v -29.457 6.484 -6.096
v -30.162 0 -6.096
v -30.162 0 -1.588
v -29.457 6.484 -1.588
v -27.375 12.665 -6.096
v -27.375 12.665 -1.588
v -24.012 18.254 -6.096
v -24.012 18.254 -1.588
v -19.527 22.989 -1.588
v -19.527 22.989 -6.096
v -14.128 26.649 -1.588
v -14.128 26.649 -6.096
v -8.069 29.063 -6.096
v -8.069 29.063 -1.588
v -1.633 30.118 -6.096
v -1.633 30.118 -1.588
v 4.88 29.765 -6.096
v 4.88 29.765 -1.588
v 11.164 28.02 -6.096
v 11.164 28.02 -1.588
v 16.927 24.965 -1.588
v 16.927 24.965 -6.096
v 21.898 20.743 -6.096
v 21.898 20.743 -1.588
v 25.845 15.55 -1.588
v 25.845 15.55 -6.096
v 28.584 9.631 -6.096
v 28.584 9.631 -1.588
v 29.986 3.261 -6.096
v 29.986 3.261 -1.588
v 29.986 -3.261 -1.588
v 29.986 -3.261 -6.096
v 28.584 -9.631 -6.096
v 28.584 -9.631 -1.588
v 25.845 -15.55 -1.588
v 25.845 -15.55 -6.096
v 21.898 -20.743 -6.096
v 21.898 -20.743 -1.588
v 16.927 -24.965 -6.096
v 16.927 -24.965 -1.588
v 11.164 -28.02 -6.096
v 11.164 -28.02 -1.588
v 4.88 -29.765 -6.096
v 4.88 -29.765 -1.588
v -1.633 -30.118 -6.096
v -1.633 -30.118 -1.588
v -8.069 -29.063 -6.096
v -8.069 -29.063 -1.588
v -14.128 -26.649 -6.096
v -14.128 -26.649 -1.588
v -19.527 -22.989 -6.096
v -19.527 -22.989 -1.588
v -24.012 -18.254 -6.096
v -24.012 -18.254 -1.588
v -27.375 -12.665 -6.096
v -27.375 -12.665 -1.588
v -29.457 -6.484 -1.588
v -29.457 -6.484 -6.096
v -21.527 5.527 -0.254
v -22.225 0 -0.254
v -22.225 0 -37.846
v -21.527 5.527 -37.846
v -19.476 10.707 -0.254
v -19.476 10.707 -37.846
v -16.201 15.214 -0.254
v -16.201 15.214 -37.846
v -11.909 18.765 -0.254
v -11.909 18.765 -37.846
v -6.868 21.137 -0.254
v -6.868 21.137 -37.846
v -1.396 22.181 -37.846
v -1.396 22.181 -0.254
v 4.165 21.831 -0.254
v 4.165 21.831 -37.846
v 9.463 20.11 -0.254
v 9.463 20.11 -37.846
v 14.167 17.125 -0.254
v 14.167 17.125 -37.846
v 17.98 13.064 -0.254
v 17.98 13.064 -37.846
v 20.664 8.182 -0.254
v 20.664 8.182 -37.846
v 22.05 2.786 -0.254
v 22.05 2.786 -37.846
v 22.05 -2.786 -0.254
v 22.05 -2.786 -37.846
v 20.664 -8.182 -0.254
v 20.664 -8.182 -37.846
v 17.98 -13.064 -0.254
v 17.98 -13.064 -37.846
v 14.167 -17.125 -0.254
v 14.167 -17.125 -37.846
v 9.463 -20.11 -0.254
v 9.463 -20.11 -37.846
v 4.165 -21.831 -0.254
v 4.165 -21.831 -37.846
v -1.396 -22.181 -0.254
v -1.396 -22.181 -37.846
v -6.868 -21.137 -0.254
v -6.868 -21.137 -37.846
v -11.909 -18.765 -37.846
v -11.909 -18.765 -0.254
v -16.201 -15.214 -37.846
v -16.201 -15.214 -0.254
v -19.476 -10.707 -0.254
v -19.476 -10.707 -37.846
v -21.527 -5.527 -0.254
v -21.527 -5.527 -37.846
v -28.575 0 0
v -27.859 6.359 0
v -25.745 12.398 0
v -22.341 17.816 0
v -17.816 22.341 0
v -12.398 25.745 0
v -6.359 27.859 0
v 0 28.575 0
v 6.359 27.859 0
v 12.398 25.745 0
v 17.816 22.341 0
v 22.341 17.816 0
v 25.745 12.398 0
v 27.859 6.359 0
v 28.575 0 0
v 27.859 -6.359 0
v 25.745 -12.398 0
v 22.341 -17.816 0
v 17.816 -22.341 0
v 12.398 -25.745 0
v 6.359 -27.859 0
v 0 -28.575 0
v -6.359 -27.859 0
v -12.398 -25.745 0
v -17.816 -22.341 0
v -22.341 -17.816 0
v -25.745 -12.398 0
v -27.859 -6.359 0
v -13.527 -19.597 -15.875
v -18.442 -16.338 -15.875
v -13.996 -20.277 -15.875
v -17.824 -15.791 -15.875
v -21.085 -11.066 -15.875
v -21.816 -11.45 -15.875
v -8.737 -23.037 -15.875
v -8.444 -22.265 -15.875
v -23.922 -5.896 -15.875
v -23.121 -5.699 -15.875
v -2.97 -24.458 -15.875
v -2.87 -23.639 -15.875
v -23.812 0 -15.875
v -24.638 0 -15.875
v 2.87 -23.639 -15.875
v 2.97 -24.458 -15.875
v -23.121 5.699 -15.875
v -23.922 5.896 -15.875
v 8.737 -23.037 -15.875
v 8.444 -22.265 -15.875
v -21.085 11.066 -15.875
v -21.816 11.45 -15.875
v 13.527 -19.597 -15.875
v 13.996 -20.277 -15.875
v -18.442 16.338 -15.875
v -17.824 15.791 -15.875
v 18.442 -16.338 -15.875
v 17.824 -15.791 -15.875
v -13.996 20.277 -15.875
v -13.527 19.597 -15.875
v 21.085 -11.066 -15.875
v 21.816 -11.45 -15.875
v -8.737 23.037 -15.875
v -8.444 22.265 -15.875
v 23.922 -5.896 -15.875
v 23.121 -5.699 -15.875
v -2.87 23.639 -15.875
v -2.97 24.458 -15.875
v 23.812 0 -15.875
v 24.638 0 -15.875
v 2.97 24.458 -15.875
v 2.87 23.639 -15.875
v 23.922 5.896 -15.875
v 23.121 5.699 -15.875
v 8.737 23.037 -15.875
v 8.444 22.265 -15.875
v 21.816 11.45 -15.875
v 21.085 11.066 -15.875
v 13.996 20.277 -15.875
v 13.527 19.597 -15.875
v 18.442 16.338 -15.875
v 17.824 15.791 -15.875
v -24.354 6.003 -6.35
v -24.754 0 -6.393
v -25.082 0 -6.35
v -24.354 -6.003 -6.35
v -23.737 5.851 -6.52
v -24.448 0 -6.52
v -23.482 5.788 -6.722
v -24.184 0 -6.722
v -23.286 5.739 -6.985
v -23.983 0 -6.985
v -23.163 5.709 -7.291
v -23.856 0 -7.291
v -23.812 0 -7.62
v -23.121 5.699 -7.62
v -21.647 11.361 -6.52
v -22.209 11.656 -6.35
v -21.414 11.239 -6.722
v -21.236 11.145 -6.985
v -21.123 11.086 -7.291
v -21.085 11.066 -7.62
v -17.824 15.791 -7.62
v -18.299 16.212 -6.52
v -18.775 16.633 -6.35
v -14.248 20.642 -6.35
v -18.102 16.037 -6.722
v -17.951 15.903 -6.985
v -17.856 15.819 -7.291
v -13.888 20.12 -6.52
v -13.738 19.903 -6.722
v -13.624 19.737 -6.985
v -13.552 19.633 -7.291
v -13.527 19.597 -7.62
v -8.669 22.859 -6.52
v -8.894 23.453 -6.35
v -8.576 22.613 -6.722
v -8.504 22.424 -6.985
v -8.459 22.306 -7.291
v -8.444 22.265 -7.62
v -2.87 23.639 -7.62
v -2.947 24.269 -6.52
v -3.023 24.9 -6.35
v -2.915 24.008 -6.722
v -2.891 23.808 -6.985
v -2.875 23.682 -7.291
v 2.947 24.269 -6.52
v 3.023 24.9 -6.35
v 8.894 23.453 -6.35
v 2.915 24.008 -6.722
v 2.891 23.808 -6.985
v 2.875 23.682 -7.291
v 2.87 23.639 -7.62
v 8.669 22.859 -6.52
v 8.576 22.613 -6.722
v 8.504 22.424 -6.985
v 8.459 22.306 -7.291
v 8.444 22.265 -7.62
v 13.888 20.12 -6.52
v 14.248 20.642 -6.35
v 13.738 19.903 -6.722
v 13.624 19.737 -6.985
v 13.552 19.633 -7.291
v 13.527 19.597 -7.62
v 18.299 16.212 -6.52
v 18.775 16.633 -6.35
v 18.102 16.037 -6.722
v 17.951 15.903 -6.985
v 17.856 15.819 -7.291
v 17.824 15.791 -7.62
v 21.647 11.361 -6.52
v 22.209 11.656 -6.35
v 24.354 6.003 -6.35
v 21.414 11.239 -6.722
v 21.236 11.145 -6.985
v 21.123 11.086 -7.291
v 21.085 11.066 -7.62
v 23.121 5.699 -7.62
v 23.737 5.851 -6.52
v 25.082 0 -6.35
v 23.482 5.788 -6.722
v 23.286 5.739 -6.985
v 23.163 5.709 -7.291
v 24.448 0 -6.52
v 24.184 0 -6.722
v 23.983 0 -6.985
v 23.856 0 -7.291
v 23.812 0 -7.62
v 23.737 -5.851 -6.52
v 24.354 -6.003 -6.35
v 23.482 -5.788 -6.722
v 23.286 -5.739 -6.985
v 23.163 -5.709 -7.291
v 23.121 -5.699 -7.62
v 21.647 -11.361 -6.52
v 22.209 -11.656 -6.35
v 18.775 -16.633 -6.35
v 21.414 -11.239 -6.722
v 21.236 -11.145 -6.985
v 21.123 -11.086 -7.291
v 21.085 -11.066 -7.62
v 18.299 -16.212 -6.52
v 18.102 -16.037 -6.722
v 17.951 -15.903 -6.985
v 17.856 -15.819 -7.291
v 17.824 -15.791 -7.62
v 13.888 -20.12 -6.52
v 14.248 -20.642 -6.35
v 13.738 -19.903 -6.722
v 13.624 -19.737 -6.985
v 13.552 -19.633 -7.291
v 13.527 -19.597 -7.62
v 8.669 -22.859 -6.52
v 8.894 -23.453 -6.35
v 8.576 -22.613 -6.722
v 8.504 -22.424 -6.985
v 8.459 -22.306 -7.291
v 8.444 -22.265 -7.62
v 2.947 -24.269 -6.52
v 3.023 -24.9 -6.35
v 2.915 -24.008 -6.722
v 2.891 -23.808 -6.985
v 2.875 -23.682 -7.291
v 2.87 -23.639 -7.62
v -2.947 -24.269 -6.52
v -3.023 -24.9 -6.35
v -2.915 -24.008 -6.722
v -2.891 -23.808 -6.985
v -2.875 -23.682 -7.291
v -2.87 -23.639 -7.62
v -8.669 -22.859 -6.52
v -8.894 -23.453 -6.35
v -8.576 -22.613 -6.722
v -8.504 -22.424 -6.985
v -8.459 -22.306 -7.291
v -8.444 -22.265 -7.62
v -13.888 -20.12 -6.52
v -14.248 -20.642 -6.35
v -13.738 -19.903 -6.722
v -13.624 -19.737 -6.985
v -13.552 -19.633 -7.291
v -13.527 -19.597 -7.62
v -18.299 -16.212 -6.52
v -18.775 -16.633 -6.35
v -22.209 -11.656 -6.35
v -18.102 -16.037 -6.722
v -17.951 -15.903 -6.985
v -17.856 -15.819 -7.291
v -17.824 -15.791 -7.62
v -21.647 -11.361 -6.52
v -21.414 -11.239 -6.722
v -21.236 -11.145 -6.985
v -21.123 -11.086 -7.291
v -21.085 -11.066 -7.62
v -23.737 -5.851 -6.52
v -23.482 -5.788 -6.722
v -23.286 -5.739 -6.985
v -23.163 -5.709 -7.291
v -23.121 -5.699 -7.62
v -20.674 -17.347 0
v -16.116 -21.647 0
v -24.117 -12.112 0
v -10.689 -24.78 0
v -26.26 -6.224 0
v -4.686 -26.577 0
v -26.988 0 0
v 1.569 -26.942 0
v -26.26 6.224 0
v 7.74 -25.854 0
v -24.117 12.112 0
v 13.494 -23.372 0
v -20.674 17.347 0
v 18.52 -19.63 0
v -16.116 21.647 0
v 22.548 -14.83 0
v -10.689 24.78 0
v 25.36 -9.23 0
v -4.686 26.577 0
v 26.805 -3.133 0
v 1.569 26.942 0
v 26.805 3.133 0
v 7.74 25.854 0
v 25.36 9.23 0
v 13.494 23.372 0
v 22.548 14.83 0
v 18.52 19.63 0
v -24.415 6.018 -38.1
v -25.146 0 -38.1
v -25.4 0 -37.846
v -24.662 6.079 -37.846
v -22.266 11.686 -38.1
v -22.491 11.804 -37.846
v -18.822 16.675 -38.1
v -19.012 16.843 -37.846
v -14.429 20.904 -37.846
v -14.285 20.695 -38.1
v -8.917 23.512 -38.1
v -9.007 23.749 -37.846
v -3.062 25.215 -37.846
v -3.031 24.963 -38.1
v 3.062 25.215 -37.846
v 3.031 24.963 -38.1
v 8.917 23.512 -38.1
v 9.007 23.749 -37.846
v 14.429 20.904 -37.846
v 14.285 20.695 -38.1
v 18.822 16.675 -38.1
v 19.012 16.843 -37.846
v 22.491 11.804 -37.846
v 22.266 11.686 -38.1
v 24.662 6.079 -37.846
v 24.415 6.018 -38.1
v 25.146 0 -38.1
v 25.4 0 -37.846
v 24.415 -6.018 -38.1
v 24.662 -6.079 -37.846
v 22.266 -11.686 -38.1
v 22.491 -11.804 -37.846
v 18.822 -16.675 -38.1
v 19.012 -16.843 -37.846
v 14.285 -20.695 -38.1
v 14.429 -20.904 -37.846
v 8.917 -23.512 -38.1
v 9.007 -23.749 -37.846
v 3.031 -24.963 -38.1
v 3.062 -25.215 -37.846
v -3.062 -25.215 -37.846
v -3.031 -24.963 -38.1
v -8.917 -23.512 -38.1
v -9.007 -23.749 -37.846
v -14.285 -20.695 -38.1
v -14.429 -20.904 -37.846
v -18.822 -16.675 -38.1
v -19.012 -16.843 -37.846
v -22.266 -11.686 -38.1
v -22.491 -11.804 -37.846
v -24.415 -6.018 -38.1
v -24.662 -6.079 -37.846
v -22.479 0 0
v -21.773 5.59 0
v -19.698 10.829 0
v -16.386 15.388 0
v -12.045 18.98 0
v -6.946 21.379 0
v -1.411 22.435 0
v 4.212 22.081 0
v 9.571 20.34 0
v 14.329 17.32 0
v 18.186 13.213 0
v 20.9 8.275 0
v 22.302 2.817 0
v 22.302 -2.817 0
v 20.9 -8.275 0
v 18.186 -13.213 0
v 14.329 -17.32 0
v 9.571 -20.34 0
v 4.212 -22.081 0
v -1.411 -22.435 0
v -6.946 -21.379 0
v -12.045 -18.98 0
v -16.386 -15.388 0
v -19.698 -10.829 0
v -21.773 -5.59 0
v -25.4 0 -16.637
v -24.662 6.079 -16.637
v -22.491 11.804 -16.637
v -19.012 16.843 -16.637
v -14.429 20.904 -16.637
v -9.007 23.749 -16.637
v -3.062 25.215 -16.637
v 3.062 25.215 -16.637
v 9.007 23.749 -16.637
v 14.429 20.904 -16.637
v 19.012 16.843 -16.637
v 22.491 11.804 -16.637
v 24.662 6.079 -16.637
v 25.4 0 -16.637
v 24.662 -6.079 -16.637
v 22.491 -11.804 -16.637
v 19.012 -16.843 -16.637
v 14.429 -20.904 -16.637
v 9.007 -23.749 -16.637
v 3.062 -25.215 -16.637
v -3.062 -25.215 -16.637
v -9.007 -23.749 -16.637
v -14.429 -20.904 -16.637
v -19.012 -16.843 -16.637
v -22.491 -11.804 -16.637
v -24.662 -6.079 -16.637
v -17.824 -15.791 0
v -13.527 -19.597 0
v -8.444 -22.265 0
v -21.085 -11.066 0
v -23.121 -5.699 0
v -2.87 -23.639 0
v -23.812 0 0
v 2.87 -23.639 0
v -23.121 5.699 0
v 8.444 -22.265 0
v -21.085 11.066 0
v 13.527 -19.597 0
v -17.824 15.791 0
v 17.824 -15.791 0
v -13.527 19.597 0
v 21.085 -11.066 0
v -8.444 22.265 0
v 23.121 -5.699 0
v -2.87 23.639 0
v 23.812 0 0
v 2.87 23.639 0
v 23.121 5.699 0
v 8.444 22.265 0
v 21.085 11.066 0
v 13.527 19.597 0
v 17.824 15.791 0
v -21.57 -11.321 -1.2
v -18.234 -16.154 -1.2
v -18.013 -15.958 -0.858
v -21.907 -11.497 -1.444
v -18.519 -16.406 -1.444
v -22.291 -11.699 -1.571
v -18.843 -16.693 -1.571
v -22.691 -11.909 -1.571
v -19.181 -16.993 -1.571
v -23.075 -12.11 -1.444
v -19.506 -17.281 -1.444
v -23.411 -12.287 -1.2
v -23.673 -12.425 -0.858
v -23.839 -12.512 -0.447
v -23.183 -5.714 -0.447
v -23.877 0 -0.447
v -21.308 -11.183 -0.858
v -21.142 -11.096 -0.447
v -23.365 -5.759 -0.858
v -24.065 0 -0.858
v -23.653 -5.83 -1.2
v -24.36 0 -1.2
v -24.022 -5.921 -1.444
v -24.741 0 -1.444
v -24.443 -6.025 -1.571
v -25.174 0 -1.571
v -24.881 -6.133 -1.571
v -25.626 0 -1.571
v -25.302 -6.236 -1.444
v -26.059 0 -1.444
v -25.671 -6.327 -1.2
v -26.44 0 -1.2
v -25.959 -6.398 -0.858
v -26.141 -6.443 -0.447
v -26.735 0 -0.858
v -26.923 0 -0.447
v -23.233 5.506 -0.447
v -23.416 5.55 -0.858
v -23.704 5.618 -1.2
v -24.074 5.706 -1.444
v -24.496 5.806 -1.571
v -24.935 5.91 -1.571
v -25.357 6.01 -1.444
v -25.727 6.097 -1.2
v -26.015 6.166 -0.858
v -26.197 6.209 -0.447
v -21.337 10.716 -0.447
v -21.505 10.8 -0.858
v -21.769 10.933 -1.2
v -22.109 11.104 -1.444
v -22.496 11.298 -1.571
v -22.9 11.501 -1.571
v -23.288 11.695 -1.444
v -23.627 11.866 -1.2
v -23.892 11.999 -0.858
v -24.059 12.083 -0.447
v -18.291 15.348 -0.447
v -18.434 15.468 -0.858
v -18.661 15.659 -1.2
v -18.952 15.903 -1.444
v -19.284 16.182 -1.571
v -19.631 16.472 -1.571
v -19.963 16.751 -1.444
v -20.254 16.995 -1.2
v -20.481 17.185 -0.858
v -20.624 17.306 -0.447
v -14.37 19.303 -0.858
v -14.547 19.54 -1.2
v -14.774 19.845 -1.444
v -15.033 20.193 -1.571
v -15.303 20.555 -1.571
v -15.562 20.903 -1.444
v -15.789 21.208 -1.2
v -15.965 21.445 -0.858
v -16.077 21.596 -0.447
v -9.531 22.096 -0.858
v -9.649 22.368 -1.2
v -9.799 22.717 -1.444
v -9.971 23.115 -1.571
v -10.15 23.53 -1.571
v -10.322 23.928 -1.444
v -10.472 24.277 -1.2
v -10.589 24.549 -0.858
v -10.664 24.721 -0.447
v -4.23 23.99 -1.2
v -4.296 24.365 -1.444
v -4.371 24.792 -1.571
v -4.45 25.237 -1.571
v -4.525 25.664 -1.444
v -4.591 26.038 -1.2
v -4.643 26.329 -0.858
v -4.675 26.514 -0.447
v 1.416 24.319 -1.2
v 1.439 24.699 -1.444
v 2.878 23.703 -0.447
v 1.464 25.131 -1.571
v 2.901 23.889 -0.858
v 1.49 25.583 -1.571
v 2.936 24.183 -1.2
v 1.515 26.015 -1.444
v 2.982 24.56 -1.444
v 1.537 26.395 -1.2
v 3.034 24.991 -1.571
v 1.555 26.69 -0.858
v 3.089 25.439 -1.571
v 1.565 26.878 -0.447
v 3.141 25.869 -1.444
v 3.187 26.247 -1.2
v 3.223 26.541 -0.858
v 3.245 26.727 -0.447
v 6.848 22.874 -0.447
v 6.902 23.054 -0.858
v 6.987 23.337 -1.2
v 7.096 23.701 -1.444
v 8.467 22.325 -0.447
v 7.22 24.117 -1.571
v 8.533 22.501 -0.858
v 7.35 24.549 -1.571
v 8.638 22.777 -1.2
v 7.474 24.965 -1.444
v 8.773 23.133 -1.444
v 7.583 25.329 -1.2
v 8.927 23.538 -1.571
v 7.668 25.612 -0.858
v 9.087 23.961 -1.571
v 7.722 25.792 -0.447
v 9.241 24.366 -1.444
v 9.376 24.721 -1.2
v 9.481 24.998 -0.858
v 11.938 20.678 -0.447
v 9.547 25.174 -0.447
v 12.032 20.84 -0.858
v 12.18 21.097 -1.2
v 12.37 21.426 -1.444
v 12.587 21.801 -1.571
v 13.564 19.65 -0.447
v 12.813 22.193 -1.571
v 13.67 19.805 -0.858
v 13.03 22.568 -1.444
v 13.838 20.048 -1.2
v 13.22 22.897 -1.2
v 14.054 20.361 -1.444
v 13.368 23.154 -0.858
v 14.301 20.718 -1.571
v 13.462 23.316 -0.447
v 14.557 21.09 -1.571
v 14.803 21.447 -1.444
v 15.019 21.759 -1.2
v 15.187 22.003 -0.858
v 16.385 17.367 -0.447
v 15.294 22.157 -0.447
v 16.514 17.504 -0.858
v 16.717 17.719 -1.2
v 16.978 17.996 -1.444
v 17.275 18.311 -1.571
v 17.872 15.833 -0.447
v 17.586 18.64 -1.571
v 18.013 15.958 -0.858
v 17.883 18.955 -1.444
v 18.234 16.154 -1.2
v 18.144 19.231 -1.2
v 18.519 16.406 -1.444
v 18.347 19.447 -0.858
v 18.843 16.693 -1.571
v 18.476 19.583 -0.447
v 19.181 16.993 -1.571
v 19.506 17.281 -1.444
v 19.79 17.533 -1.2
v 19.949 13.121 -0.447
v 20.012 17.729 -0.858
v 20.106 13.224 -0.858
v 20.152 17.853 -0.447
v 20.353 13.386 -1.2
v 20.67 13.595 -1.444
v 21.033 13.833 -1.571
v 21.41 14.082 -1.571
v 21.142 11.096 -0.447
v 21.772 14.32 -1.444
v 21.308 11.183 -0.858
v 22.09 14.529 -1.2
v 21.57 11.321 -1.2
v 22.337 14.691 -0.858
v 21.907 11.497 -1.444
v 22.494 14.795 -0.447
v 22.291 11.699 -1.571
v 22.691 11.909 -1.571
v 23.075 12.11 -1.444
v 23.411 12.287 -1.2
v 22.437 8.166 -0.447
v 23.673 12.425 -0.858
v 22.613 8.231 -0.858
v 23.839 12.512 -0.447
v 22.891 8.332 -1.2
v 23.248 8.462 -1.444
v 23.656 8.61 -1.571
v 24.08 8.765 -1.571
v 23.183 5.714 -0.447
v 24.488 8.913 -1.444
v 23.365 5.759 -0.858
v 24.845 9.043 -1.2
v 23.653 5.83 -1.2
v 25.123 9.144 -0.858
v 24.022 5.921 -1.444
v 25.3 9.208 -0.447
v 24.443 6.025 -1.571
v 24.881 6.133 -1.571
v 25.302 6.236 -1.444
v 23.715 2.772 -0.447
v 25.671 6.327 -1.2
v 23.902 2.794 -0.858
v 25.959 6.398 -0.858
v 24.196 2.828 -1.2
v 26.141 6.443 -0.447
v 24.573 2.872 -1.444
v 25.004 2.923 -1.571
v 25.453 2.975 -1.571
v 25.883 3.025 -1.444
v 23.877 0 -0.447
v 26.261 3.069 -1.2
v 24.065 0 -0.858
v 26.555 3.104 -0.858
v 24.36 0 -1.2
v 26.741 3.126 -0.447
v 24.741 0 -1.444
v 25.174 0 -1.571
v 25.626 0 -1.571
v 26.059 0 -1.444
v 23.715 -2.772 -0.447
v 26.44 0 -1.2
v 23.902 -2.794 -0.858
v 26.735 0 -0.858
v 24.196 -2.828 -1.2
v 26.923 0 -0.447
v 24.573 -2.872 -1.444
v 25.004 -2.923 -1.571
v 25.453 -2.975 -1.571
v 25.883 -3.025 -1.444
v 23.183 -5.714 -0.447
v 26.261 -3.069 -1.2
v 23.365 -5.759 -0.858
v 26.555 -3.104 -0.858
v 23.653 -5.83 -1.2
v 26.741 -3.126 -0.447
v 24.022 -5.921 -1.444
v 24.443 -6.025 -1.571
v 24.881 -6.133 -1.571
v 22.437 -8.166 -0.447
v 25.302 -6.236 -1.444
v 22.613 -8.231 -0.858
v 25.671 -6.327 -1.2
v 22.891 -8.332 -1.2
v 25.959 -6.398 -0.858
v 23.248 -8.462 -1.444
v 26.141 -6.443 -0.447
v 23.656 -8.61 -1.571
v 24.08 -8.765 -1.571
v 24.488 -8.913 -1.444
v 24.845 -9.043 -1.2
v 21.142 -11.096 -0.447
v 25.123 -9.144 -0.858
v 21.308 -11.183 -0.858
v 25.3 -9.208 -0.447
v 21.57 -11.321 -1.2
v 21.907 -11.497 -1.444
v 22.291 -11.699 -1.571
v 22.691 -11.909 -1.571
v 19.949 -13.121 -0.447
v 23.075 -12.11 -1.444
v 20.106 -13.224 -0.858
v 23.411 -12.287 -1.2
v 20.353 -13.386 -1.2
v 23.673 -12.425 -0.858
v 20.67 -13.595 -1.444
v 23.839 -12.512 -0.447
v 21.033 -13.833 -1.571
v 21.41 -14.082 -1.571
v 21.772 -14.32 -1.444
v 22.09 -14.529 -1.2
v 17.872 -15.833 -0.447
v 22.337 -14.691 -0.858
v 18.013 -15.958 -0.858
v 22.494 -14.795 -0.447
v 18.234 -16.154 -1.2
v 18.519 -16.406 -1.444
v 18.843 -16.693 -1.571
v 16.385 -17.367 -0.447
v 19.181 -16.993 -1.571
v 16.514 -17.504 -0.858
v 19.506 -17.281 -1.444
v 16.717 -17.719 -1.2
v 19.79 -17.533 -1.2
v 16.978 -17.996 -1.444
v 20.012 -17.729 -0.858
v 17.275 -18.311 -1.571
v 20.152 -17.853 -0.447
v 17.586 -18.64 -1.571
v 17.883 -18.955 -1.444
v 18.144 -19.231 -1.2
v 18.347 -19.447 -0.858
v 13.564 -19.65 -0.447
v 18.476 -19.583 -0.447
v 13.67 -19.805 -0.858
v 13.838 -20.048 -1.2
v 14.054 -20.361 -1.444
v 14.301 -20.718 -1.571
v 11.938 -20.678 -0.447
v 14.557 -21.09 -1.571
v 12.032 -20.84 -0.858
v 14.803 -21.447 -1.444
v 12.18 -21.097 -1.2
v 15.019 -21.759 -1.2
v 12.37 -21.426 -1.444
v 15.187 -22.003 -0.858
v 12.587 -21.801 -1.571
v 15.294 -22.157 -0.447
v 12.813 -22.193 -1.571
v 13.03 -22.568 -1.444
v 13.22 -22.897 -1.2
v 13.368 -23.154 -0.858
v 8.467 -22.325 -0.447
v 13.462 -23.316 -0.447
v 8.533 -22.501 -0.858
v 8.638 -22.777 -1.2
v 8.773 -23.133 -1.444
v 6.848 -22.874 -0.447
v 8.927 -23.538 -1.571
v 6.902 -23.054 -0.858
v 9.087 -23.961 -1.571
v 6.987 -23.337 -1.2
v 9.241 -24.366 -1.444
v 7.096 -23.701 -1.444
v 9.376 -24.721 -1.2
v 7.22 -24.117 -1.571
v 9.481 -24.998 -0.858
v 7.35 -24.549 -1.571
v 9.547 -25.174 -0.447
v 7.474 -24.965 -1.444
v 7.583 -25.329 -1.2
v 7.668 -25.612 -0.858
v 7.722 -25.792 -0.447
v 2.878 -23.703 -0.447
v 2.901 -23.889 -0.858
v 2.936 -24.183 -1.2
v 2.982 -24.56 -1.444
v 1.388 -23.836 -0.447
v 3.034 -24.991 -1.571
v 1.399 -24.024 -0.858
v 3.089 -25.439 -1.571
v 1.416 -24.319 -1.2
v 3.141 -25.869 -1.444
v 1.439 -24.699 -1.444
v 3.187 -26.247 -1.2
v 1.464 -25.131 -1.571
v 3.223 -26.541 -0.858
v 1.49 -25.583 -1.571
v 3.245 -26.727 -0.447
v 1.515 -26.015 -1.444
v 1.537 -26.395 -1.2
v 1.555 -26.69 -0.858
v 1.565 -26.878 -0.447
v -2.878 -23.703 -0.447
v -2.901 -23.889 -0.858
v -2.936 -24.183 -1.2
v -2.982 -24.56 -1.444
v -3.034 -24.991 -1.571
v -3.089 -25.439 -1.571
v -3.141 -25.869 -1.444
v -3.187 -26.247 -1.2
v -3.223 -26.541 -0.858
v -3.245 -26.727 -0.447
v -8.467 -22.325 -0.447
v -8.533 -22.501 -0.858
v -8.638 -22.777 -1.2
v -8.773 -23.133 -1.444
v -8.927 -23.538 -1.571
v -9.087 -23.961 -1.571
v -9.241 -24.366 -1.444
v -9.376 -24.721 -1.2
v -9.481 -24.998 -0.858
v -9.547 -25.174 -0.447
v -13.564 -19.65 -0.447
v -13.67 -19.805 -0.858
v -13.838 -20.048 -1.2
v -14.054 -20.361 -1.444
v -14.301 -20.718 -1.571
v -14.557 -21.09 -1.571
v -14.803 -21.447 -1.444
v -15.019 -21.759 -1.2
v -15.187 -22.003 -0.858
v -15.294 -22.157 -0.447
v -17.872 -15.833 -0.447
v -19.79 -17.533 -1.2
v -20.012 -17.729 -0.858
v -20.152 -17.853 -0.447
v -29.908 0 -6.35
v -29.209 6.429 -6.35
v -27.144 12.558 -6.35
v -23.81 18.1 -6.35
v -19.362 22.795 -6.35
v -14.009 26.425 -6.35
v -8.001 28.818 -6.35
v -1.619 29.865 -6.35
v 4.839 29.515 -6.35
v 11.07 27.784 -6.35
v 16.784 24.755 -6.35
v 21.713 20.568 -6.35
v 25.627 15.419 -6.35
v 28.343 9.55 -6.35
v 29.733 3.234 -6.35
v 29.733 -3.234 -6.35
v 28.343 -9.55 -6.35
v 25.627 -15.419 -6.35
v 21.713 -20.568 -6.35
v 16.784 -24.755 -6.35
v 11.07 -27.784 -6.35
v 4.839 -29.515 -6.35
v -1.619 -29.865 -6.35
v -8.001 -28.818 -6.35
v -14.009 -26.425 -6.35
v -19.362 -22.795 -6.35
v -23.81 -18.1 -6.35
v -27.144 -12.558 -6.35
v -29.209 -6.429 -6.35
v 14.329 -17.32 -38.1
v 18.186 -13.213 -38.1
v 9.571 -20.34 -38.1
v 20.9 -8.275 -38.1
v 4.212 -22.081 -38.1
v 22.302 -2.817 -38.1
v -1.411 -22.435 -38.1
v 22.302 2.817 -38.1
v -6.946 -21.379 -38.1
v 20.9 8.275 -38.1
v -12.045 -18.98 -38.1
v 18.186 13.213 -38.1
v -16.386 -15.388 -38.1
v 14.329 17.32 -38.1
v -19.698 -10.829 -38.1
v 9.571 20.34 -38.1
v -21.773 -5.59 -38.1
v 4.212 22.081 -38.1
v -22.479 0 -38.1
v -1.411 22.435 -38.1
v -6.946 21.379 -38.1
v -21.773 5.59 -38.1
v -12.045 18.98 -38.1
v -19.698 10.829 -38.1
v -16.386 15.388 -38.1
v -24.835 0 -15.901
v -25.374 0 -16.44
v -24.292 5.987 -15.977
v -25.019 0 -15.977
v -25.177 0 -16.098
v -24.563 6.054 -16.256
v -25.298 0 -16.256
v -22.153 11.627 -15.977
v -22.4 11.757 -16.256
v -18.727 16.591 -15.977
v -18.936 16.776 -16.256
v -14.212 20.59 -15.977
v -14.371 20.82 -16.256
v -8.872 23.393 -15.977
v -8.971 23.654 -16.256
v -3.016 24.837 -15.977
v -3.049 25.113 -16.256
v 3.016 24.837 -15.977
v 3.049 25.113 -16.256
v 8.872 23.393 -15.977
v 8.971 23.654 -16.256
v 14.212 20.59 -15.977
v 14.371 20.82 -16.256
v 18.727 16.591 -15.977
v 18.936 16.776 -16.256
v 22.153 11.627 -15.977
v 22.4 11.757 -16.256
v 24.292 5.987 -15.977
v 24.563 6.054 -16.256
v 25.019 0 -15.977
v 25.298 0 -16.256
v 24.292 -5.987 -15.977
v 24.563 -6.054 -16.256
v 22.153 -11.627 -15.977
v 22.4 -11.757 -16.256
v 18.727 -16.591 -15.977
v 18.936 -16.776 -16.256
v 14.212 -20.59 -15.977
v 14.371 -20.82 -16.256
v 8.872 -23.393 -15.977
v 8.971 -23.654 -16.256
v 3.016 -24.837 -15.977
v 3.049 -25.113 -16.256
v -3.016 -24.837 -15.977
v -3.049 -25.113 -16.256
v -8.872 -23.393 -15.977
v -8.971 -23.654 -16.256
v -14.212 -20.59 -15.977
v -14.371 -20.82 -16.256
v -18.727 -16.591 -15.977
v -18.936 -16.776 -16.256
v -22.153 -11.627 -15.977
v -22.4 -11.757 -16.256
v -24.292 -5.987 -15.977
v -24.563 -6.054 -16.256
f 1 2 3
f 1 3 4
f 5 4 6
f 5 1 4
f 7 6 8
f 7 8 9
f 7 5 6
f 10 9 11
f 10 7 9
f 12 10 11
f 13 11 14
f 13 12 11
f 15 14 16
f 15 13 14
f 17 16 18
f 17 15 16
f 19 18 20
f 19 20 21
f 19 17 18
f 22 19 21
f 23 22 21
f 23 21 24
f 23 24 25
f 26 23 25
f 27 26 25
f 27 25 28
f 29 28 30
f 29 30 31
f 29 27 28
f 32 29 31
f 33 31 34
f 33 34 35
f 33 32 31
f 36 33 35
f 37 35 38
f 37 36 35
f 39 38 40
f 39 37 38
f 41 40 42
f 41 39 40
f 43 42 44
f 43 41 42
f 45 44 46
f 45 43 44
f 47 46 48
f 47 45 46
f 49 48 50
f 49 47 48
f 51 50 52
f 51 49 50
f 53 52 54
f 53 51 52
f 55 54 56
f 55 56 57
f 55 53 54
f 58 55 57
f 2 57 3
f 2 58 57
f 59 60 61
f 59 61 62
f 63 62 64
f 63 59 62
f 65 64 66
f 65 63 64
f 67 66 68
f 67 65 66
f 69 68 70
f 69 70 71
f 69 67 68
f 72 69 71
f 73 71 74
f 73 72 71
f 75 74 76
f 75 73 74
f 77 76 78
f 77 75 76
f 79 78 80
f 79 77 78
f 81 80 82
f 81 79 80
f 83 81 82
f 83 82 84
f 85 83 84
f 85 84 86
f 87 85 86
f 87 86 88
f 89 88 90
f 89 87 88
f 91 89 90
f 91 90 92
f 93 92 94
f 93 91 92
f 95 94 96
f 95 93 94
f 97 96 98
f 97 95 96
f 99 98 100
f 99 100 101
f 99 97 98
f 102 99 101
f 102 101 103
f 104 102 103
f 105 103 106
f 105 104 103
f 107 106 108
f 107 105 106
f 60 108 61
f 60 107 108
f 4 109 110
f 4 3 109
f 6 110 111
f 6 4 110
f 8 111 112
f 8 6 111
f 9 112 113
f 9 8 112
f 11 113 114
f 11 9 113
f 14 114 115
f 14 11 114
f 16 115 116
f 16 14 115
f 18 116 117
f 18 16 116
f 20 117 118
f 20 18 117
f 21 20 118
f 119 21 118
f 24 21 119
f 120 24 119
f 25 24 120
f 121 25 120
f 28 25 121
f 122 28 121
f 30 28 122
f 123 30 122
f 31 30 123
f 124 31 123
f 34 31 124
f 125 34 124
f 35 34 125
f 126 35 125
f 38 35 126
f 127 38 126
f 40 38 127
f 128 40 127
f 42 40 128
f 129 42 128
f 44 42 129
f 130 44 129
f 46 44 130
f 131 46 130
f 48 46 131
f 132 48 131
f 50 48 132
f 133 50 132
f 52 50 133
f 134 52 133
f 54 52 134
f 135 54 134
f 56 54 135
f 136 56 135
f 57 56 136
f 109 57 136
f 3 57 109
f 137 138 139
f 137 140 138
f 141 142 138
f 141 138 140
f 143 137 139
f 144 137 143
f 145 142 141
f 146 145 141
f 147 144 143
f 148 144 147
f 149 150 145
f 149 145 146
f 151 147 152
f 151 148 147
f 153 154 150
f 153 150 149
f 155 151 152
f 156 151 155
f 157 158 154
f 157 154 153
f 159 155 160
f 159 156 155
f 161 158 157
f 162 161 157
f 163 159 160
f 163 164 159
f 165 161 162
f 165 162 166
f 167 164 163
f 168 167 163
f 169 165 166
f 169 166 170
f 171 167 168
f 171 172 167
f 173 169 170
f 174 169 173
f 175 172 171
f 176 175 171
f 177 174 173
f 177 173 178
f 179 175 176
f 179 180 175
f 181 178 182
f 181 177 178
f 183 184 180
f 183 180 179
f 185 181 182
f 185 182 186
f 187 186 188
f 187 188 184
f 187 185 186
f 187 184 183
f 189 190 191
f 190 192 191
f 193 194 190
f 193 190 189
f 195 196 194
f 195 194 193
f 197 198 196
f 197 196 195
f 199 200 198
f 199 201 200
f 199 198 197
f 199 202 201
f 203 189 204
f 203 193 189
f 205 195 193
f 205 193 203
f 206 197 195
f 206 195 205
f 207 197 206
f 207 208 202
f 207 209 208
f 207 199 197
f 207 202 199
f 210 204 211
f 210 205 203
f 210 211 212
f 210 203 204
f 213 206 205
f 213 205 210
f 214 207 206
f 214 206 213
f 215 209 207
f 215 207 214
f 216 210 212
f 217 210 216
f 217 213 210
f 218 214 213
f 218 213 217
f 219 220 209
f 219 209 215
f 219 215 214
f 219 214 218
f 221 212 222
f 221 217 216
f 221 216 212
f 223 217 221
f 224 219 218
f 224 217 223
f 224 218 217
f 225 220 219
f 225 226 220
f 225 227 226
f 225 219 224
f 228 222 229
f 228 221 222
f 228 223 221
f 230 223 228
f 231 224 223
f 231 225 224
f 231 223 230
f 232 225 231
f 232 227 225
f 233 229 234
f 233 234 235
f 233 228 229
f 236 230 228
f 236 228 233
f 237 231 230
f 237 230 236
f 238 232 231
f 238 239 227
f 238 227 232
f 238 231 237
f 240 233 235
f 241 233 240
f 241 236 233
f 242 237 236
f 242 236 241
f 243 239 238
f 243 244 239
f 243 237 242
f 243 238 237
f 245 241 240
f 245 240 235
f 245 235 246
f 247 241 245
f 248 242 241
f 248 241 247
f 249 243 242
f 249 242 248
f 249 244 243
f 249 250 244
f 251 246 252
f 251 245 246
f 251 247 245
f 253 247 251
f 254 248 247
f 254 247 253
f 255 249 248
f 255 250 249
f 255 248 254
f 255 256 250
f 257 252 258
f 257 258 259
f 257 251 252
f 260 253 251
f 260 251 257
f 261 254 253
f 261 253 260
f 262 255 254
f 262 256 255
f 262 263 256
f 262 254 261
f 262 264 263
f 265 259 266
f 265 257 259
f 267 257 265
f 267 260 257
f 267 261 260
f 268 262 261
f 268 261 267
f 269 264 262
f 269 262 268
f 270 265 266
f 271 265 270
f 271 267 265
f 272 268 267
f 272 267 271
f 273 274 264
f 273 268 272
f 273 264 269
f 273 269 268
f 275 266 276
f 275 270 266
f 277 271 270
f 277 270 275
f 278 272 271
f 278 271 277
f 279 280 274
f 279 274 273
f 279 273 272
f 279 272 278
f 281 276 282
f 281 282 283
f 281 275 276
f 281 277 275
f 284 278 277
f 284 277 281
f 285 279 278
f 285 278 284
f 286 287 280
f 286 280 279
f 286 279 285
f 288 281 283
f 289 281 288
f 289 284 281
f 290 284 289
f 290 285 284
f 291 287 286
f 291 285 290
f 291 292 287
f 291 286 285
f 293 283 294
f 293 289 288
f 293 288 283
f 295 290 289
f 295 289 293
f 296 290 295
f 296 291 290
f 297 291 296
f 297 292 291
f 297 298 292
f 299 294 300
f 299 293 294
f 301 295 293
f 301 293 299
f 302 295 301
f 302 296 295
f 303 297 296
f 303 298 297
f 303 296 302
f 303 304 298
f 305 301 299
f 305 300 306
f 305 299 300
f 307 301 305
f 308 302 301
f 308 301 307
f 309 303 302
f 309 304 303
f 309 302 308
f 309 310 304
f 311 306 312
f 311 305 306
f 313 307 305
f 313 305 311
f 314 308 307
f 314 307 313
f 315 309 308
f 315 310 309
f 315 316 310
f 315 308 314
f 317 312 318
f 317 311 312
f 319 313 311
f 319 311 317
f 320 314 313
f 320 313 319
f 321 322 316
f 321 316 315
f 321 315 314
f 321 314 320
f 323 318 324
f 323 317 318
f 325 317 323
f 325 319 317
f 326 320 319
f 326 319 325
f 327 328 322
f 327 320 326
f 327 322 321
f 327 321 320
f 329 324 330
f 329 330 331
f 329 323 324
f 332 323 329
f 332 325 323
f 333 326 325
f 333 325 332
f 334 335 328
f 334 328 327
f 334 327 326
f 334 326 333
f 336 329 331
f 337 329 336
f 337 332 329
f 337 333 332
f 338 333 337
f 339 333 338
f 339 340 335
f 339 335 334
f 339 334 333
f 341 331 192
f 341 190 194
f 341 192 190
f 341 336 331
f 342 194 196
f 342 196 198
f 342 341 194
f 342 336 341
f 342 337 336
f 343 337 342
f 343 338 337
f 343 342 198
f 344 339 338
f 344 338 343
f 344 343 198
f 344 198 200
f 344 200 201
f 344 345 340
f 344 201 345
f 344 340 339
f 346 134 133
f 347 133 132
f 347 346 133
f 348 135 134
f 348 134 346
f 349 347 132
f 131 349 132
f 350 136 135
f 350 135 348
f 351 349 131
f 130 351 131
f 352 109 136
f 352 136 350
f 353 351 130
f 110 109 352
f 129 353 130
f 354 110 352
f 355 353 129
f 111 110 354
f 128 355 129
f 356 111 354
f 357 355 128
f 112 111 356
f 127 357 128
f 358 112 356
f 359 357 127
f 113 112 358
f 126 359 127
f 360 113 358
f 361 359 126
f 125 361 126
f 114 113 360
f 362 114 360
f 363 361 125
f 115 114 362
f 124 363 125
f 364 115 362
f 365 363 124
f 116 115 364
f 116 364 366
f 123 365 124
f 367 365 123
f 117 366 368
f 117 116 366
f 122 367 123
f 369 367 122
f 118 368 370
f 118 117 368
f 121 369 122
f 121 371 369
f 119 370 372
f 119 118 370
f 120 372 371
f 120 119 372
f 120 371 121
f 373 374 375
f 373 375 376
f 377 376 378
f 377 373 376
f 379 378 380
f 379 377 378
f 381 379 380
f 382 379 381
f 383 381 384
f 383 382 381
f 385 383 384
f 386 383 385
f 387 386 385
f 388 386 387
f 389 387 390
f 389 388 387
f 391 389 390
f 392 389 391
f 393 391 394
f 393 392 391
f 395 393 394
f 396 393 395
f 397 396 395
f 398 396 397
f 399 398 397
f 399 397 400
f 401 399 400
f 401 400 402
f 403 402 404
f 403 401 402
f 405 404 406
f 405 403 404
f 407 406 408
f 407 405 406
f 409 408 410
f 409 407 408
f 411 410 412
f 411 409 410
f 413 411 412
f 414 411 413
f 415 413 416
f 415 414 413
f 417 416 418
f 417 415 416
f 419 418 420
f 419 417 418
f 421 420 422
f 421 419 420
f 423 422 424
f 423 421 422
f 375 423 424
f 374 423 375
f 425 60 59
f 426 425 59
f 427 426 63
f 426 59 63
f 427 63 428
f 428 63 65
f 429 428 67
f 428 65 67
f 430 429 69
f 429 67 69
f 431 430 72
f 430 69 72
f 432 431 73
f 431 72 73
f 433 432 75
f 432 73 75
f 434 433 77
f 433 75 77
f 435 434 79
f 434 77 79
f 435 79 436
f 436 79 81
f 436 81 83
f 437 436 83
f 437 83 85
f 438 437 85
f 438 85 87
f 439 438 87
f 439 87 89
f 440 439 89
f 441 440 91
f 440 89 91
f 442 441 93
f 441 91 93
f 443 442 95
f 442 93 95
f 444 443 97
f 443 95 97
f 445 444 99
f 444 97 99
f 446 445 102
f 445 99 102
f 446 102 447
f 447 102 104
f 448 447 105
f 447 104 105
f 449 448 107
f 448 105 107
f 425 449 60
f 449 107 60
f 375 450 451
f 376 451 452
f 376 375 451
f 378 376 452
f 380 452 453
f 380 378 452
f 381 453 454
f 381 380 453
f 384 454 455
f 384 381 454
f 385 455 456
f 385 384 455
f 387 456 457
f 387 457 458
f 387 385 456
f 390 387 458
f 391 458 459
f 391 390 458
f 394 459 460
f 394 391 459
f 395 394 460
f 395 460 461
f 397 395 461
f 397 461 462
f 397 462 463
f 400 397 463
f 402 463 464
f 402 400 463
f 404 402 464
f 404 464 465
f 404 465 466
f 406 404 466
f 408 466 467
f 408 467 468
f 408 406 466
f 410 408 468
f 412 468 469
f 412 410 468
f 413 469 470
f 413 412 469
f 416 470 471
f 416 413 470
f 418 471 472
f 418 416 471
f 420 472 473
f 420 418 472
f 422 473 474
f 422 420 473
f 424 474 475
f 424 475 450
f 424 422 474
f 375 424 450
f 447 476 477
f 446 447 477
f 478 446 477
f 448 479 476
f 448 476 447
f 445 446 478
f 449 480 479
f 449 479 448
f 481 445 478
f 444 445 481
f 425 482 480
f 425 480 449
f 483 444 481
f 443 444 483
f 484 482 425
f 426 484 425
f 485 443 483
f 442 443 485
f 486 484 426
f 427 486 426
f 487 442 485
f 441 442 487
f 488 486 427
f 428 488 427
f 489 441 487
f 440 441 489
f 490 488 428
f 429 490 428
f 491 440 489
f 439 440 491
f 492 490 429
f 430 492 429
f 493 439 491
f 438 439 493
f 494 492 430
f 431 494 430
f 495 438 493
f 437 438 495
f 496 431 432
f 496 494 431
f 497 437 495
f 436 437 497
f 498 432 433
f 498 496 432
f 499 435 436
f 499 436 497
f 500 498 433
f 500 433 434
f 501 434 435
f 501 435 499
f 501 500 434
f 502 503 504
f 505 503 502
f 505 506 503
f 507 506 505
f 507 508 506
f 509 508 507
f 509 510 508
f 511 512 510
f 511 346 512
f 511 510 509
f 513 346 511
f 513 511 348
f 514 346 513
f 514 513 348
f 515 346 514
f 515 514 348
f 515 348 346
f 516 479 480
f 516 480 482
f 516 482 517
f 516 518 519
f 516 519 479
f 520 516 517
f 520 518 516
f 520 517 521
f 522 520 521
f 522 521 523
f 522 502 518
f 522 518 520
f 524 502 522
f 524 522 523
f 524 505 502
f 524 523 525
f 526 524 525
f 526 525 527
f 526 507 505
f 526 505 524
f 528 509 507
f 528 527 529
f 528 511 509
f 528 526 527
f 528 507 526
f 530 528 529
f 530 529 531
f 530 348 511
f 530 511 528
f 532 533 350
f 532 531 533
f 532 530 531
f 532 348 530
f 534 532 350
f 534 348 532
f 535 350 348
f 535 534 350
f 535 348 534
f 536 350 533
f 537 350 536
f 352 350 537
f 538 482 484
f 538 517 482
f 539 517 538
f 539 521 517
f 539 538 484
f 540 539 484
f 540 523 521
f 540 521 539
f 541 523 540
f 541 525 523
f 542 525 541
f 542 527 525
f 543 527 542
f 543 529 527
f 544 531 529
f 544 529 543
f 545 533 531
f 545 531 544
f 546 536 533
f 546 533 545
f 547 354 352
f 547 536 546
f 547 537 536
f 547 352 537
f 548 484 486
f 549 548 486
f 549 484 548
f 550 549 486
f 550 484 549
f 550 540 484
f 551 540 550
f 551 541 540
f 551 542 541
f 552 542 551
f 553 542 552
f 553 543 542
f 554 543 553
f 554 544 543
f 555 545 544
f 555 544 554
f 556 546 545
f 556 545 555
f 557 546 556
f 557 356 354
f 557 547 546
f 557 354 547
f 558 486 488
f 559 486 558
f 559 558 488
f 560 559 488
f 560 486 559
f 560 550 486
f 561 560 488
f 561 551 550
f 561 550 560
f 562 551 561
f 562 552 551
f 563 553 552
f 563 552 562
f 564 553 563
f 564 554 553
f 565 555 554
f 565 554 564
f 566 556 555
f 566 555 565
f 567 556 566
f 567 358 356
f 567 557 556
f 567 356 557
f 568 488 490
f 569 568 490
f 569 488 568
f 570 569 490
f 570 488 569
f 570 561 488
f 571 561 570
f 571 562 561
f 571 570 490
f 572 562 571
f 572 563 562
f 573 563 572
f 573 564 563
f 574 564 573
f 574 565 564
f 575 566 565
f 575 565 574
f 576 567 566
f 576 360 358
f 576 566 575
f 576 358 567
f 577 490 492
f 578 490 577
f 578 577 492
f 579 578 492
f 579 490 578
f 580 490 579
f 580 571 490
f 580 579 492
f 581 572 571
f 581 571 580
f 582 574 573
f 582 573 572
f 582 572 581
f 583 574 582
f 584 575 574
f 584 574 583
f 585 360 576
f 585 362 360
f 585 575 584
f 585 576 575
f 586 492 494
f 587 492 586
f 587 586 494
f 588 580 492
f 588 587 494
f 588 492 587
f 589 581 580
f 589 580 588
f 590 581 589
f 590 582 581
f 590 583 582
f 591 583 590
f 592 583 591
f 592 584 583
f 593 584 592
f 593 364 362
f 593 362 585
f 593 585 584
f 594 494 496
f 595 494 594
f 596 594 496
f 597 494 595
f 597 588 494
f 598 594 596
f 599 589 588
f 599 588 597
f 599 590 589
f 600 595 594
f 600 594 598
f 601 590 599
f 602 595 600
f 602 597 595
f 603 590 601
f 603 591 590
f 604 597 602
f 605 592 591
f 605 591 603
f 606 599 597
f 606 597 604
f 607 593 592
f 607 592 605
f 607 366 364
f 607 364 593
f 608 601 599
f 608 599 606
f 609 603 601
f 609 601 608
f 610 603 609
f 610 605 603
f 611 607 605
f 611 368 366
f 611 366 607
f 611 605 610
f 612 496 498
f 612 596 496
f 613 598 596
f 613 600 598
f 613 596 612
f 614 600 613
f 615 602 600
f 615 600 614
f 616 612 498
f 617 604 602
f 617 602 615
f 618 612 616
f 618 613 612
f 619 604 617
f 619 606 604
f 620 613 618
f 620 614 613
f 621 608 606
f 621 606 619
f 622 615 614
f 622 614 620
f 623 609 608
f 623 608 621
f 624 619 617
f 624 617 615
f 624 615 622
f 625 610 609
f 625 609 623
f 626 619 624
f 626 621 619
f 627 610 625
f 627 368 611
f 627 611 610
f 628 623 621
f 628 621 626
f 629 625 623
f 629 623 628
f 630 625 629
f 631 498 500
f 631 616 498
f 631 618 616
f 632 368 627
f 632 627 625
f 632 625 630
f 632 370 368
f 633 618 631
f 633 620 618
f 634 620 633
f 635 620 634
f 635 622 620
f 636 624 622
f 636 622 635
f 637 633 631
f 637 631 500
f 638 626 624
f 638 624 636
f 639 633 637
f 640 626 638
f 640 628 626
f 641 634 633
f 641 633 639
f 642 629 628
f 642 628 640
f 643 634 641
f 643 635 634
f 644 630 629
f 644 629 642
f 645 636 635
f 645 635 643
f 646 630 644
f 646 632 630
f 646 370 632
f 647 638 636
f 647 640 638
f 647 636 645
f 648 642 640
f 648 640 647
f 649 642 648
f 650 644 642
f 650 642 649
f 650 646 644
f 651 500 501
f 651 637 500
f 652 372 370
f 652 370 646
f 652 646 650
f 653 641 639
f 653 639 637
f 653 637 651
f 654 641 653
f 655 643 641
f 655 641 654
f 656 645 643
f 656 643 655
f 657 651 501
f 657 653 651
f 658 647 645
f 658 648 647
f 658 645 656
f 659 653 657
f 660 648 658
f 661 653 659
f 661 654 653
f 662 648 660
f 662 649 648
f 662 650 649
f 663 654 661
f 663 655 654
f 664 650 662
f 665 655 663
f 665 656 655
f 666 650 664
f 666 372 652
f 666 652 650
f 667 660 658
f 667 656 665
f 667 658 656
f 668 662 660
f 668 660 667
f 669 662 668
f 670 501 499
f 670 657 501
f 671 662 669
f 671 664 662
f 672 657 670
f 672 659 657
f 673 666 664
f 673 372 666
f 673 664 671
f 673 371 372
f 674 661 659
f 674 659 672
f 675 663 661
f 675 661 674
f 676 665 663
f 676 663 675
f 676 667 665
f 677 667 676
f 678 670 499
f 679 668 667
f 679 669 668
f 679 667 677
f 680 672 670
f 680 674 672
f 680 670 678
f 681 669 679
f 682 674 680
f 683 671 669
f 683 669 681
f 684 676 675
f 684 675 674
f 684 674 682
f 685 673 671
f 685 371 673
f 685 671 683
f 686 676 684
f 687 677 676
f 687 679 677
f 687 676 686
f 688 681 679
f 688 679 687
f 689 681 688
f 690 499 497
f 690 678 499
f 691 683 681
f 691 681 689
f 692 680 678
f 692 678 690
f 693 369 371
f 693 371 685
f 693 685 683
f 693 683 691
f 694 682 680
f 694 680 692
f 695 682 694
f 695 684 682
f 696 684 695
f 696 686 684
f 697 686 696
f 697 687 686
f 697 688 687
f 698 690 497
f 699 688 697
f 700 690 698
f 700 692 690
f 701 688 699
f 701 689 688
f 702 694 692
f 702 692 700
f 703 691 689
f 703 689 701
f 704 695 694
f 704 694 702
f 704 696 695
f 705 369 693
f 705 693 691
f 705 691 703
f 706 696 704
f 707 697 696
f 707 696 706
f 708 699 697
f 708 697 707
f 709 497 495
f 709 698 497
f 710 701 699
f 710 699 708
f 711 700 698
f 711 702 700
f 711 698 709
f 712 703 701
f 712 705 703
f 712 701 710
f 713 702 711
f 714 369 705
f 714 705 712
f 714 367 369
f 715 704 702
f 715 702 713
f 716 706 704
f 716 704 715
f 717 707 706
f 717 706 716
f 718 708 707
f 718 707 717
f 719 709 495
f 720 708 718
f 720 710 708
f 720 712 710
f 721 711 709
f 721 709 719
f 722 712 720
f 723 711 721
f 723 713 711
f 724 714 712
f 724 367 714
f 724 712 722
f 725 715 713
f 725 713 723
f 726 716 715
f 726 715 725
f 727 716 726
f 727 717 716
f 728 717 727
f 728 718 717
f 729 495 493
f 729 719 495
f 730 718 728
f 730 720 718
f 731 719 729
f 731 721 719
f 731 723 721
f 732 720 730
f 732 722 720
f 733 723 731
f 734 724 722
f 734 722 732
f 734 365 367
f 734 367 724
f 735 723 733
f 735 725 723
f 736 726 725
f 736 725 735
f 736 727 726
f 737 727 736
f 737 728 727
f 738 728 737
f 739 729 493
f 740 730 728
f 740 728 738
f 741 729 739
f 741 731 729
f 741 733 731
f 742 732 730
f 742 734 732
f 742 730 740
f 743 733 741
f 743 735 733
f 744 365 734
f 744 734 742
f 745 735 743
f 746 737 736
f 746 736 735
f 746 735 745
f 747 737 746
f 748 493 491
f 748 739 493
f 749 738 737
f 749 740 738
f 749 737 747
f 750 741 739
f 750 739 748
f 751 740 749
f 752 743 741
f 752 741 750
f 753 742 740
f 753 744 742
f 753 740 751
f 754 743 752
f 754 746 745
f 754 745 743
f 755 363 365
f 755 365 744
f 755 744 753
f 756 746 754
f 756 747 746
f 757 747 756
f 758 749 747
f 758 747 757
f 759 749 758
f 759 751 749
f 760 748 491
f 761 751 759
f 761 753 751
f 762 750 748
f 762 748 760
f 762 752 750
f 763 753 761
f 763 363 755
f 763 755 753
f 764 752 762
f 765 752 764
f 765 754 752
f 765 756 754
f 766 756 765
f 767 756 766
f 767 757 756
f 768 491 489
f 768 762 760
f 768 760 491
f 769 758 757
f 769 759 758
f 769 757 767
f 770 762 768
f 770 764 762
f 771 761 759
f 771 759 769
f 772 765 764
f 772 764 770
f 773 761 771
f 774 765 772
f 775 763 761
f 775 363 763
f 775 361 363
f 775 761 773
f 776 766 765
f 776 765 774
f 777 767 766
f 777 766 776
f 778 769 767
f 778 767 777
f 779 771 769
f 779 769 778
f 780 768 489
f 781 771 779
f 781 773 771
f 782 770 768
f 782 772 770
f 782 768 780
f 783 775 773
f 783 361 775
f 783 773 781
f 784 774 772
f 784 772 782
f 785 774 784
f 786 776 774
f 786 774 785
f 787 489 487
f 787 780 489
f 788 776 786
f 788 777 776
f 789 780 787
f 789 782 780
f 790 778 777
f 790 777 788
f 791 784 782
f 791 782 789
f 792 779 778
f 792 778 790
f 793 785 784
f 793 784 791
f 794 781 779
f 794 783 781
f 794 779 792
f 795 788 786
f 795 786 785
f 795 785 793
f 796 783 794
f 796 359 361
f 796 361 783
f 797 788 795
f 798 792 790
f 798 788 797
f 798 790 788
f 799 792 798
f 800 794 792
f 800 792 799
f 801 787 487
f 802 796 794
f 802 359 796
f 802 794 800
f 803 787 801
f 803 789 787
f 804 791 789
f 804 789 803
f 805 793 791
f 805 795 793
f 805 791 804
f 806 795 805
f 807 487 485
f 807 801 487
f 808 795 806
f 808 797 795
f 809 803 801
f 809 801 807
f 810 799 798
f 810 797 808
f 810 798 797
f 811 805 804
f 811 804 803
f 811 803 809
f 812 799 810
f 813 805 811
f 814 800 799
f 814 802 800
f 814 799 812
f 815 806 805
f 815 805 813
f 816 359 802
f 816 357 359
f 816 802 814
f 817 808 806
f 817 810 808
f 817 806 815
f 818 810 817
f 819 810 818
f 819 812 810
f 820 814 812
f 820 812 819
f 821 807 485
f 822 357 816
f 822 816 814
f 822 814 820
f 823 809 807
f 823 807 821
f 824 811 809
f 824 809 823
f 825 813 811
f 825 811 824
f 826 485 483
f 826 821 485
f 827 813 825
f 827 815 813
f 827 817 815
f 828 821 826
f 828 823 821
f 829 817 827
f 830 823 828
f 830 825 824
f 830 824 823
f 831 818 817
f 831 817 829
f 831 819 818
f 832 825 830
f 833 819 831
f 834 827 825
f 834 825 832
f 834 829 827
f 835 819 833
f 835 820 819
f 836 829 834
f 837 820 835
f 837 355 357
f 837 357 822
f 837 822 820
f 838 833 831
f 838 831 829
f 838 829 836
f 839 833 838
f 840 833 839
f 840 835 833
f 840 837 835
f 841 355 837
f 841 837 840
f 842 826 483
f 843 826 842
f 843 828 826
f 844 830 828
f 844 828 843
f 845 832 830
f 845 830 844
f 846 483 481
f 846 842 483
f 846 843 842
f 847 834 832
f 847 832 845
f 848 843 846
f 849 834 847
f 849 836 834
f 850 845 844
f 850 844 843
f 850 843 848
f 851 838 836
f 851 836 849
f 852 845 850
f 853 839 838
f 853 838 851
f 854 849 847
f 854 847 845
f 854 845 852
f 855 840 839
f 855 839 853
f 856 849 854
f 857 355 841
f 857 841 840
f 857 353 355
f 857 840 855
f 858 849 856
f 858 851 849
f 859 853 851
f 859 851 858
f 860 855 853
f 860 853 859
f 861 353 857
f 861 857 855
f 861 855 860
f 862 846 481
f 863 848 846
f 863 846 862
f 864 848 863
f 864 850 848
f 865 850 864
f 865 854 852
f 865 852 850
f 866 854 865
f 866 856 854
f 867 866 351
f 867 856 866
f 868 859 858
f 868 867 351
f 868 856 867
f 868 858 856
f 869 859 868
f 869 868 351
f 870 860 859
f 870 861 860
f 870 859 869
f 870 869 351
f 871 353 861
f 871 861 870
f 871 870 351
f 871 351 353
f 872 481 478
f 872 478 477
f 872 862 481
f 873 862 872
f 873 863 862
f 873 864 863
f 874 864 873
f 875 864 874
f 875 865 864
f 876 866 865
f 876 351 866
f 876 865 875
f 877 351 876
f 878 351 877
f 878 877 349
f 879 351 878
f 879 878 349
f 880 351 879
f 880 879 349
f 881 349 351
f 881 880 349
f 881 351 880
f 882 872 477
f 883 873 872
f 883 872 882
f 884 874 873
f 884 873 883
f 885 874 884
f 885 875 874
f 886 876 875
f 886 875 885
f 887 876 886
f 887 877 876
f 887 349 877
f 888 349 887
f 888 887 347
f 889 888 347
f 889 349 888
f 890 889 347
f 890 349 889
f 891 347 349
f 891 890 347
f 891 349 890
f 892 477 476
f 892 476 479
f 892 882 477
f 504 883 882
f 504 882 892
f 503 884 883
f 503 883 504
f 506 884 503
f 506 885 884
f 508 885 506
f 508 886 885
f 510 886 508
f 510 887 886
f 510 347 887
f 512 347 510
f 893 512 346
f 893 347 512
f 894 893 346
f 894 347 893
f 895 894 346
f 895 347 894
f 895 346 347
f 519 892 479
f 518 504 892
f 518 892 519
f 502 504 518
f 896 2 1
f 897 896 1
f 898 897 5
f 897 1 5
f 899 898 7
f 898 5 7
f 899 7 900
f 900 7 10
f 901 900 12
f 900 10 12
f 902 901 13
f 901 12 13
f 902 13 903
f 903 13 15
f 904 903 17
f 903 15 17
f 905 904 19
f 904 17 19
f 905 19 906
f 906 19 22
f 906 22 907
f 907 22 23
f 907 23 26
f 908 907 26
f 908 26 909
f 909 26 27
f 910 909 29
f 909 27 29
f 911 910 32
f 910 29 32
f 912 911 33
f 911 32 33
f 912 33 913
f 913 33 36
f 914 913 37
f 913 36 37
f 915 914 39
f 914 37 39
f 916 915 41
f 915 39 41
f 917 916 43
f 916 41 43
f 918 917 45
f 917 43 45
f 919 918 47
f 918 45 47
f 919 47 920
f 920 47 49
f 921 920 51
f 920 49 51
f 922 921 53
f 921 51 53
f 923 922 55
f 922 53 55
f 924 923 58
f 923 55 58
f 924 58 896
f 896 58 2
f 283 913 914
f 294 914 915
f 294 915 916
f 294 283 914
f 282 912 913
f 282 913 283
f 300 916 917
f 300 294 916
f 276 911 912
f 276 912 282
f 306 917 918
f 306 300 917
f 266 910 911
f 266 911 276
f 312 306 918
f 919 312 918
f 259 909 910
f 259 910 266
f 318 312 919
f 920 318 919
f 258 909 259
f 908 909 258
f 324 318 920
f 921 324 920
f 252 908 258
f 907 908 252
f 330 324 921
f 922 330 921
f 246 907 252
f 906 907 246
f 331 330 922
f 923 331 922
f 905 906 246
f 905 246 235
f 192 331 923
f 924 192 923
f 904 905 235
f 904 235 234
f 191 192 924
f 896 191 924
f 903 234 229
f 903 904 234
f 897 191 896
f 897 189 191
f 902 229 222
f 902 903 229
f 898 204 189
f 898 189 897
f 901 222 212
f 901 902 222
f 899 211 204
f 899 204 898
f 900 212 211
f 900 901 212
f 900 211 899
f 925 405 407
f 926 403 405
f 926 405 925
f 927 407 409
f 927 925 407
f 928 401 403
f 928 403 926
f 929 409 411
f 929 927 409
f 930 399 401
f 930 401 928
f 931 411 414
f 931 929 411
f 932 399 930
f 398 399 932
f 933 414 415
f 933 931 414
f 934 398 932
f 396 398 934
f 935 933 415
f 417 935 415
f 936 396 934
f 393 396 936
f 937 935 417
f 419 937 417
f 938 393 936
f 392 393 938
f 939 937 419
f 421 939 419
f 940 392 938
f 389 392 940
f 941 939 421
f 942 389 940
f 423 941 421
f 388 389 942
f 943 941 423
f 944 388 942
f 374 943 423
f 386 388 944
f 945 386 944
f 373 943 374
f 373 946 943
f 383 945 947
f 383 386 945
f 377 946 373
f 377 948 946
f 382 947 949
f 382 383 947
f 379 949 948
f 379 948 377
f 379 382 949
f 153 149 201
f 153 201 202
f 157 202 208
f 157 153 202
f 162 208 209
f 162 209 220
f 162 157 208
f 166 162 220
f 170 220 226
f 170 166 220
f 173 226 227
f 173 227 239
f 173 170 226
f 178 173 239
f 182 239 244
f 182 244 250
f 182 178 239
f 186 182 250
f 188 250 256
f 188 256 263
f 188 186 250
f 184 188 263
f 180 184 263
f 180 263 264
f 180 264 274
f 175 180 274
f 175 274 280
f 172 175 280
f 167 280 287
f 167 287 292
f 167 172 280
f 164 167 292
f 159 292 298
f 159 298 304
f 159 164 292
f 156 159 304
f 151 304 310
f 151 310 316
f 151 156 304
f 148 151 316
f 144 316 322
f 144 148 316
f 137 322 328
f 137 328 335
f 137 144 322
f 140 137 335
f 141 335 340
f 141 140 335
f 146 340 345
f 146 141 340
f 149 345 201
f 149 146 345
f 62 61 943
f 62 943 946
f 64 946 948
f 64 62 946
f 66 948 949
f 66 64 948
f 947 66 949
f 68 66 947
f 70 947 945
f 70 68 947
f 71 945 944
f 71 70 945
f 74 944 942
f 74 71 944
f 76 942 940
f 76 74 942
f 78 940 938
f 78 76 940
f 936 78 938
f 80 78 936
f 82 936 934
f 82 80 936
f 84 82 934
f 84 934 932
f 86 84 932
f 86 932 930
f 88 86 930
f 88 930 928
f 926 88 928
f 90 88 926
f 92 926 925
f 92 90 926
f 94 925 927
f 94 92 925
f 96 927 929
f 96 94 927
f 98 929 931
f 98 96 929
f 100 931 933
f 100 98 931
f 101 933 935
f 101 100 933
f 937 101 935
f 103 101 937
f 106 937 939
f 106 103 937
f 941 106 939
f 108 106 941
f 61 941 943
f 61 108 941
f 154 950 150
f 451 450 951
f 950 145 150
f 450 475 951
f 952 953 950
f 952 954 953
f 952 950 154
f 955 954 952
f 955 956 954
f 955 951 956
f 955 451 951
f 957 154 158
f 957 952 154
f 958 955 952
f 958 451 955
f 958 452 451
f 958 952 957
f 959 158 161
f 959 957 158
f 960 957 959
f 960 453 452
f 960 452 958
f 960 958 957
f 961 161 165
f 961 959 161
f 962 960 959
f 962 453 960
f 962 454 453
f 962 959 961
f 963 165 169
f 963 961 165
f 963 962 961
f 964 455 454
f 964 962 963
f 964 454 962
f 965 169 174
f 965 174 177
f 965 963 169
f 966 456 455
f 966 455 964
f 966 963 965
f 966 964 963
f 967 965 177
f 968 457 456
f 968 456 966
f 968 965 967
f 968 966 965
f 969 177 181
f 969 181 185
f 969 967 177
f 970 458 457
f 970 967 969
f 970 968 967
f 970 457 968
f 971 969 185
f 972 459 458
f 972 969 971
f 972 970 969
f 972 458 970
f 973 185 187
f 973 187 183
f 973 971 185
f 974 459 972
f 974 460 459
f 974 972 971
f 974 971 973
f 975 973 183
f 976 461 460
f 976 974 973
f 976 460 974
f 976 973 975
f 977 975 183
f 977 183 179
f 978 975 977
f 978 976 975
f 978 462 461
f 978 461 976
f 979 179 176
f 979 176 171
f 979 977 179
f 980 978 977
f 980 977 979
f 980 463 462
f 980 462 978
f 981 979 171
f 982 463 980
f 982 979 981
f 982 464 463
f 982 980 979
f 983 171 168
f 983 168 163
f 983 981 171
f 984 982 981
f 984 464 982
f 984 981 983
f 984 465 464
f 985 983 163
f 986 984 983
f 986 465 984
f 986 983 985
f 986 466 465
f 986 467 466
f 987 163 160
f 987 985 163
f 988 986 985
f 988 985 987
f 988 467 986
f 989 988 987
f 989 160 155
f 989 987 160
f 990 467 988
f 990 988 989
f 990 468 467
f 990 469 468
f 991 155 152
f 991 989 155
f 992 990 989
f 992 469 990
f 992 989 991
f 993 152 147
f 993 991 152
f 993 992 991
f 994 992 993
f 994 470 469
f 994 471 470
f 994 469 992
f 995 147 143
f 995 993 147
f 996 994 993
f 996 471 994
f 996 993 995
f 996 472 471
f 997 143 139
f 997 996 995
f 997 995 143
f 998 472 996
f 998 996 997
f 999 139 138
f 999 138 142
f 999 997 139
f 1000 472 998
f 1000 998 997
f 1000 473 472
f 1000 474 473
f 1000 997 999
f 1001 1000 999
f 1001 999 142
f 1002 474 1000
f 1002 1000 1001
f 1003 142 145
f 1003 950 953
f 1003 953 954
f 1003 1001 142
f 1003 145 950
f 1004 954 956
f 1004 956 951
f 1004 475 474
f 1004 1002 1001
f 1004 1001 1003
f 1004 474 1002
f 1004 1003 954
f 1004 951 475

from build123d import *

# Parameters (mm, degrees)
F2_R    = 1.27
F3_SIZE = 0.254


with BuildPart() as f1:
    # F0 (on Front) → F1 (revolve)
    with BuildSketch(Plane.XZ):
        with BuildLine():
            Line((-22.225, -38.1), (-22.225, 0))
            Line((-22.225, 0), (-23.8125, 0))
            ThreePointArc((-23.8125, 0), (-25.4, -1.5875), (-26.9875, 0))
            Line((-26.9875, 0), (-28.575, 0))
            Line((-28.575, 0), (-30.1625, -1.5875))
            Line((-30.1625, -1.5875), (-30.1625, -6.35))
            Line((-30.1625, -6.35), (-23.8125, -6.35))
            Line((-23.8125, -6.35), (-23.8125, -15.875))
            Line((-23.8125, -15.875), (-24.638, -15.875))
            ThreePointArc((-24.638, -15.875), (-25.176815, -16.098185), (-25.4, -16.637))
            Line((-25.4, -16.637), (-25.4, -38.1))
            Line((-25.4, -38.1), (-22.225, -38.1))
        make_face()
    revolve(axis=Axis((0, 0, -15.143116), (0, 0, -1)))

    # F2
    f2_edges = [f1.edges().sort_by_distance(p)[0] for p in [
        (23.8125, 0, -6.35),
    ]]
    fillet(f2_edges, radius=F2_R)

    # F3
    f3_edges = [f1.edges().sort_by_distance(p)[0] for p in [
        (30.1625, 0, -6.35),
        (25.4, 0, -38.1),
        (22.225, 0, 0),
        (22.225, 0, -38.1),
    ]]
    chamfer(f3_edges, length=F3_SIZE)


solid = f1.part
